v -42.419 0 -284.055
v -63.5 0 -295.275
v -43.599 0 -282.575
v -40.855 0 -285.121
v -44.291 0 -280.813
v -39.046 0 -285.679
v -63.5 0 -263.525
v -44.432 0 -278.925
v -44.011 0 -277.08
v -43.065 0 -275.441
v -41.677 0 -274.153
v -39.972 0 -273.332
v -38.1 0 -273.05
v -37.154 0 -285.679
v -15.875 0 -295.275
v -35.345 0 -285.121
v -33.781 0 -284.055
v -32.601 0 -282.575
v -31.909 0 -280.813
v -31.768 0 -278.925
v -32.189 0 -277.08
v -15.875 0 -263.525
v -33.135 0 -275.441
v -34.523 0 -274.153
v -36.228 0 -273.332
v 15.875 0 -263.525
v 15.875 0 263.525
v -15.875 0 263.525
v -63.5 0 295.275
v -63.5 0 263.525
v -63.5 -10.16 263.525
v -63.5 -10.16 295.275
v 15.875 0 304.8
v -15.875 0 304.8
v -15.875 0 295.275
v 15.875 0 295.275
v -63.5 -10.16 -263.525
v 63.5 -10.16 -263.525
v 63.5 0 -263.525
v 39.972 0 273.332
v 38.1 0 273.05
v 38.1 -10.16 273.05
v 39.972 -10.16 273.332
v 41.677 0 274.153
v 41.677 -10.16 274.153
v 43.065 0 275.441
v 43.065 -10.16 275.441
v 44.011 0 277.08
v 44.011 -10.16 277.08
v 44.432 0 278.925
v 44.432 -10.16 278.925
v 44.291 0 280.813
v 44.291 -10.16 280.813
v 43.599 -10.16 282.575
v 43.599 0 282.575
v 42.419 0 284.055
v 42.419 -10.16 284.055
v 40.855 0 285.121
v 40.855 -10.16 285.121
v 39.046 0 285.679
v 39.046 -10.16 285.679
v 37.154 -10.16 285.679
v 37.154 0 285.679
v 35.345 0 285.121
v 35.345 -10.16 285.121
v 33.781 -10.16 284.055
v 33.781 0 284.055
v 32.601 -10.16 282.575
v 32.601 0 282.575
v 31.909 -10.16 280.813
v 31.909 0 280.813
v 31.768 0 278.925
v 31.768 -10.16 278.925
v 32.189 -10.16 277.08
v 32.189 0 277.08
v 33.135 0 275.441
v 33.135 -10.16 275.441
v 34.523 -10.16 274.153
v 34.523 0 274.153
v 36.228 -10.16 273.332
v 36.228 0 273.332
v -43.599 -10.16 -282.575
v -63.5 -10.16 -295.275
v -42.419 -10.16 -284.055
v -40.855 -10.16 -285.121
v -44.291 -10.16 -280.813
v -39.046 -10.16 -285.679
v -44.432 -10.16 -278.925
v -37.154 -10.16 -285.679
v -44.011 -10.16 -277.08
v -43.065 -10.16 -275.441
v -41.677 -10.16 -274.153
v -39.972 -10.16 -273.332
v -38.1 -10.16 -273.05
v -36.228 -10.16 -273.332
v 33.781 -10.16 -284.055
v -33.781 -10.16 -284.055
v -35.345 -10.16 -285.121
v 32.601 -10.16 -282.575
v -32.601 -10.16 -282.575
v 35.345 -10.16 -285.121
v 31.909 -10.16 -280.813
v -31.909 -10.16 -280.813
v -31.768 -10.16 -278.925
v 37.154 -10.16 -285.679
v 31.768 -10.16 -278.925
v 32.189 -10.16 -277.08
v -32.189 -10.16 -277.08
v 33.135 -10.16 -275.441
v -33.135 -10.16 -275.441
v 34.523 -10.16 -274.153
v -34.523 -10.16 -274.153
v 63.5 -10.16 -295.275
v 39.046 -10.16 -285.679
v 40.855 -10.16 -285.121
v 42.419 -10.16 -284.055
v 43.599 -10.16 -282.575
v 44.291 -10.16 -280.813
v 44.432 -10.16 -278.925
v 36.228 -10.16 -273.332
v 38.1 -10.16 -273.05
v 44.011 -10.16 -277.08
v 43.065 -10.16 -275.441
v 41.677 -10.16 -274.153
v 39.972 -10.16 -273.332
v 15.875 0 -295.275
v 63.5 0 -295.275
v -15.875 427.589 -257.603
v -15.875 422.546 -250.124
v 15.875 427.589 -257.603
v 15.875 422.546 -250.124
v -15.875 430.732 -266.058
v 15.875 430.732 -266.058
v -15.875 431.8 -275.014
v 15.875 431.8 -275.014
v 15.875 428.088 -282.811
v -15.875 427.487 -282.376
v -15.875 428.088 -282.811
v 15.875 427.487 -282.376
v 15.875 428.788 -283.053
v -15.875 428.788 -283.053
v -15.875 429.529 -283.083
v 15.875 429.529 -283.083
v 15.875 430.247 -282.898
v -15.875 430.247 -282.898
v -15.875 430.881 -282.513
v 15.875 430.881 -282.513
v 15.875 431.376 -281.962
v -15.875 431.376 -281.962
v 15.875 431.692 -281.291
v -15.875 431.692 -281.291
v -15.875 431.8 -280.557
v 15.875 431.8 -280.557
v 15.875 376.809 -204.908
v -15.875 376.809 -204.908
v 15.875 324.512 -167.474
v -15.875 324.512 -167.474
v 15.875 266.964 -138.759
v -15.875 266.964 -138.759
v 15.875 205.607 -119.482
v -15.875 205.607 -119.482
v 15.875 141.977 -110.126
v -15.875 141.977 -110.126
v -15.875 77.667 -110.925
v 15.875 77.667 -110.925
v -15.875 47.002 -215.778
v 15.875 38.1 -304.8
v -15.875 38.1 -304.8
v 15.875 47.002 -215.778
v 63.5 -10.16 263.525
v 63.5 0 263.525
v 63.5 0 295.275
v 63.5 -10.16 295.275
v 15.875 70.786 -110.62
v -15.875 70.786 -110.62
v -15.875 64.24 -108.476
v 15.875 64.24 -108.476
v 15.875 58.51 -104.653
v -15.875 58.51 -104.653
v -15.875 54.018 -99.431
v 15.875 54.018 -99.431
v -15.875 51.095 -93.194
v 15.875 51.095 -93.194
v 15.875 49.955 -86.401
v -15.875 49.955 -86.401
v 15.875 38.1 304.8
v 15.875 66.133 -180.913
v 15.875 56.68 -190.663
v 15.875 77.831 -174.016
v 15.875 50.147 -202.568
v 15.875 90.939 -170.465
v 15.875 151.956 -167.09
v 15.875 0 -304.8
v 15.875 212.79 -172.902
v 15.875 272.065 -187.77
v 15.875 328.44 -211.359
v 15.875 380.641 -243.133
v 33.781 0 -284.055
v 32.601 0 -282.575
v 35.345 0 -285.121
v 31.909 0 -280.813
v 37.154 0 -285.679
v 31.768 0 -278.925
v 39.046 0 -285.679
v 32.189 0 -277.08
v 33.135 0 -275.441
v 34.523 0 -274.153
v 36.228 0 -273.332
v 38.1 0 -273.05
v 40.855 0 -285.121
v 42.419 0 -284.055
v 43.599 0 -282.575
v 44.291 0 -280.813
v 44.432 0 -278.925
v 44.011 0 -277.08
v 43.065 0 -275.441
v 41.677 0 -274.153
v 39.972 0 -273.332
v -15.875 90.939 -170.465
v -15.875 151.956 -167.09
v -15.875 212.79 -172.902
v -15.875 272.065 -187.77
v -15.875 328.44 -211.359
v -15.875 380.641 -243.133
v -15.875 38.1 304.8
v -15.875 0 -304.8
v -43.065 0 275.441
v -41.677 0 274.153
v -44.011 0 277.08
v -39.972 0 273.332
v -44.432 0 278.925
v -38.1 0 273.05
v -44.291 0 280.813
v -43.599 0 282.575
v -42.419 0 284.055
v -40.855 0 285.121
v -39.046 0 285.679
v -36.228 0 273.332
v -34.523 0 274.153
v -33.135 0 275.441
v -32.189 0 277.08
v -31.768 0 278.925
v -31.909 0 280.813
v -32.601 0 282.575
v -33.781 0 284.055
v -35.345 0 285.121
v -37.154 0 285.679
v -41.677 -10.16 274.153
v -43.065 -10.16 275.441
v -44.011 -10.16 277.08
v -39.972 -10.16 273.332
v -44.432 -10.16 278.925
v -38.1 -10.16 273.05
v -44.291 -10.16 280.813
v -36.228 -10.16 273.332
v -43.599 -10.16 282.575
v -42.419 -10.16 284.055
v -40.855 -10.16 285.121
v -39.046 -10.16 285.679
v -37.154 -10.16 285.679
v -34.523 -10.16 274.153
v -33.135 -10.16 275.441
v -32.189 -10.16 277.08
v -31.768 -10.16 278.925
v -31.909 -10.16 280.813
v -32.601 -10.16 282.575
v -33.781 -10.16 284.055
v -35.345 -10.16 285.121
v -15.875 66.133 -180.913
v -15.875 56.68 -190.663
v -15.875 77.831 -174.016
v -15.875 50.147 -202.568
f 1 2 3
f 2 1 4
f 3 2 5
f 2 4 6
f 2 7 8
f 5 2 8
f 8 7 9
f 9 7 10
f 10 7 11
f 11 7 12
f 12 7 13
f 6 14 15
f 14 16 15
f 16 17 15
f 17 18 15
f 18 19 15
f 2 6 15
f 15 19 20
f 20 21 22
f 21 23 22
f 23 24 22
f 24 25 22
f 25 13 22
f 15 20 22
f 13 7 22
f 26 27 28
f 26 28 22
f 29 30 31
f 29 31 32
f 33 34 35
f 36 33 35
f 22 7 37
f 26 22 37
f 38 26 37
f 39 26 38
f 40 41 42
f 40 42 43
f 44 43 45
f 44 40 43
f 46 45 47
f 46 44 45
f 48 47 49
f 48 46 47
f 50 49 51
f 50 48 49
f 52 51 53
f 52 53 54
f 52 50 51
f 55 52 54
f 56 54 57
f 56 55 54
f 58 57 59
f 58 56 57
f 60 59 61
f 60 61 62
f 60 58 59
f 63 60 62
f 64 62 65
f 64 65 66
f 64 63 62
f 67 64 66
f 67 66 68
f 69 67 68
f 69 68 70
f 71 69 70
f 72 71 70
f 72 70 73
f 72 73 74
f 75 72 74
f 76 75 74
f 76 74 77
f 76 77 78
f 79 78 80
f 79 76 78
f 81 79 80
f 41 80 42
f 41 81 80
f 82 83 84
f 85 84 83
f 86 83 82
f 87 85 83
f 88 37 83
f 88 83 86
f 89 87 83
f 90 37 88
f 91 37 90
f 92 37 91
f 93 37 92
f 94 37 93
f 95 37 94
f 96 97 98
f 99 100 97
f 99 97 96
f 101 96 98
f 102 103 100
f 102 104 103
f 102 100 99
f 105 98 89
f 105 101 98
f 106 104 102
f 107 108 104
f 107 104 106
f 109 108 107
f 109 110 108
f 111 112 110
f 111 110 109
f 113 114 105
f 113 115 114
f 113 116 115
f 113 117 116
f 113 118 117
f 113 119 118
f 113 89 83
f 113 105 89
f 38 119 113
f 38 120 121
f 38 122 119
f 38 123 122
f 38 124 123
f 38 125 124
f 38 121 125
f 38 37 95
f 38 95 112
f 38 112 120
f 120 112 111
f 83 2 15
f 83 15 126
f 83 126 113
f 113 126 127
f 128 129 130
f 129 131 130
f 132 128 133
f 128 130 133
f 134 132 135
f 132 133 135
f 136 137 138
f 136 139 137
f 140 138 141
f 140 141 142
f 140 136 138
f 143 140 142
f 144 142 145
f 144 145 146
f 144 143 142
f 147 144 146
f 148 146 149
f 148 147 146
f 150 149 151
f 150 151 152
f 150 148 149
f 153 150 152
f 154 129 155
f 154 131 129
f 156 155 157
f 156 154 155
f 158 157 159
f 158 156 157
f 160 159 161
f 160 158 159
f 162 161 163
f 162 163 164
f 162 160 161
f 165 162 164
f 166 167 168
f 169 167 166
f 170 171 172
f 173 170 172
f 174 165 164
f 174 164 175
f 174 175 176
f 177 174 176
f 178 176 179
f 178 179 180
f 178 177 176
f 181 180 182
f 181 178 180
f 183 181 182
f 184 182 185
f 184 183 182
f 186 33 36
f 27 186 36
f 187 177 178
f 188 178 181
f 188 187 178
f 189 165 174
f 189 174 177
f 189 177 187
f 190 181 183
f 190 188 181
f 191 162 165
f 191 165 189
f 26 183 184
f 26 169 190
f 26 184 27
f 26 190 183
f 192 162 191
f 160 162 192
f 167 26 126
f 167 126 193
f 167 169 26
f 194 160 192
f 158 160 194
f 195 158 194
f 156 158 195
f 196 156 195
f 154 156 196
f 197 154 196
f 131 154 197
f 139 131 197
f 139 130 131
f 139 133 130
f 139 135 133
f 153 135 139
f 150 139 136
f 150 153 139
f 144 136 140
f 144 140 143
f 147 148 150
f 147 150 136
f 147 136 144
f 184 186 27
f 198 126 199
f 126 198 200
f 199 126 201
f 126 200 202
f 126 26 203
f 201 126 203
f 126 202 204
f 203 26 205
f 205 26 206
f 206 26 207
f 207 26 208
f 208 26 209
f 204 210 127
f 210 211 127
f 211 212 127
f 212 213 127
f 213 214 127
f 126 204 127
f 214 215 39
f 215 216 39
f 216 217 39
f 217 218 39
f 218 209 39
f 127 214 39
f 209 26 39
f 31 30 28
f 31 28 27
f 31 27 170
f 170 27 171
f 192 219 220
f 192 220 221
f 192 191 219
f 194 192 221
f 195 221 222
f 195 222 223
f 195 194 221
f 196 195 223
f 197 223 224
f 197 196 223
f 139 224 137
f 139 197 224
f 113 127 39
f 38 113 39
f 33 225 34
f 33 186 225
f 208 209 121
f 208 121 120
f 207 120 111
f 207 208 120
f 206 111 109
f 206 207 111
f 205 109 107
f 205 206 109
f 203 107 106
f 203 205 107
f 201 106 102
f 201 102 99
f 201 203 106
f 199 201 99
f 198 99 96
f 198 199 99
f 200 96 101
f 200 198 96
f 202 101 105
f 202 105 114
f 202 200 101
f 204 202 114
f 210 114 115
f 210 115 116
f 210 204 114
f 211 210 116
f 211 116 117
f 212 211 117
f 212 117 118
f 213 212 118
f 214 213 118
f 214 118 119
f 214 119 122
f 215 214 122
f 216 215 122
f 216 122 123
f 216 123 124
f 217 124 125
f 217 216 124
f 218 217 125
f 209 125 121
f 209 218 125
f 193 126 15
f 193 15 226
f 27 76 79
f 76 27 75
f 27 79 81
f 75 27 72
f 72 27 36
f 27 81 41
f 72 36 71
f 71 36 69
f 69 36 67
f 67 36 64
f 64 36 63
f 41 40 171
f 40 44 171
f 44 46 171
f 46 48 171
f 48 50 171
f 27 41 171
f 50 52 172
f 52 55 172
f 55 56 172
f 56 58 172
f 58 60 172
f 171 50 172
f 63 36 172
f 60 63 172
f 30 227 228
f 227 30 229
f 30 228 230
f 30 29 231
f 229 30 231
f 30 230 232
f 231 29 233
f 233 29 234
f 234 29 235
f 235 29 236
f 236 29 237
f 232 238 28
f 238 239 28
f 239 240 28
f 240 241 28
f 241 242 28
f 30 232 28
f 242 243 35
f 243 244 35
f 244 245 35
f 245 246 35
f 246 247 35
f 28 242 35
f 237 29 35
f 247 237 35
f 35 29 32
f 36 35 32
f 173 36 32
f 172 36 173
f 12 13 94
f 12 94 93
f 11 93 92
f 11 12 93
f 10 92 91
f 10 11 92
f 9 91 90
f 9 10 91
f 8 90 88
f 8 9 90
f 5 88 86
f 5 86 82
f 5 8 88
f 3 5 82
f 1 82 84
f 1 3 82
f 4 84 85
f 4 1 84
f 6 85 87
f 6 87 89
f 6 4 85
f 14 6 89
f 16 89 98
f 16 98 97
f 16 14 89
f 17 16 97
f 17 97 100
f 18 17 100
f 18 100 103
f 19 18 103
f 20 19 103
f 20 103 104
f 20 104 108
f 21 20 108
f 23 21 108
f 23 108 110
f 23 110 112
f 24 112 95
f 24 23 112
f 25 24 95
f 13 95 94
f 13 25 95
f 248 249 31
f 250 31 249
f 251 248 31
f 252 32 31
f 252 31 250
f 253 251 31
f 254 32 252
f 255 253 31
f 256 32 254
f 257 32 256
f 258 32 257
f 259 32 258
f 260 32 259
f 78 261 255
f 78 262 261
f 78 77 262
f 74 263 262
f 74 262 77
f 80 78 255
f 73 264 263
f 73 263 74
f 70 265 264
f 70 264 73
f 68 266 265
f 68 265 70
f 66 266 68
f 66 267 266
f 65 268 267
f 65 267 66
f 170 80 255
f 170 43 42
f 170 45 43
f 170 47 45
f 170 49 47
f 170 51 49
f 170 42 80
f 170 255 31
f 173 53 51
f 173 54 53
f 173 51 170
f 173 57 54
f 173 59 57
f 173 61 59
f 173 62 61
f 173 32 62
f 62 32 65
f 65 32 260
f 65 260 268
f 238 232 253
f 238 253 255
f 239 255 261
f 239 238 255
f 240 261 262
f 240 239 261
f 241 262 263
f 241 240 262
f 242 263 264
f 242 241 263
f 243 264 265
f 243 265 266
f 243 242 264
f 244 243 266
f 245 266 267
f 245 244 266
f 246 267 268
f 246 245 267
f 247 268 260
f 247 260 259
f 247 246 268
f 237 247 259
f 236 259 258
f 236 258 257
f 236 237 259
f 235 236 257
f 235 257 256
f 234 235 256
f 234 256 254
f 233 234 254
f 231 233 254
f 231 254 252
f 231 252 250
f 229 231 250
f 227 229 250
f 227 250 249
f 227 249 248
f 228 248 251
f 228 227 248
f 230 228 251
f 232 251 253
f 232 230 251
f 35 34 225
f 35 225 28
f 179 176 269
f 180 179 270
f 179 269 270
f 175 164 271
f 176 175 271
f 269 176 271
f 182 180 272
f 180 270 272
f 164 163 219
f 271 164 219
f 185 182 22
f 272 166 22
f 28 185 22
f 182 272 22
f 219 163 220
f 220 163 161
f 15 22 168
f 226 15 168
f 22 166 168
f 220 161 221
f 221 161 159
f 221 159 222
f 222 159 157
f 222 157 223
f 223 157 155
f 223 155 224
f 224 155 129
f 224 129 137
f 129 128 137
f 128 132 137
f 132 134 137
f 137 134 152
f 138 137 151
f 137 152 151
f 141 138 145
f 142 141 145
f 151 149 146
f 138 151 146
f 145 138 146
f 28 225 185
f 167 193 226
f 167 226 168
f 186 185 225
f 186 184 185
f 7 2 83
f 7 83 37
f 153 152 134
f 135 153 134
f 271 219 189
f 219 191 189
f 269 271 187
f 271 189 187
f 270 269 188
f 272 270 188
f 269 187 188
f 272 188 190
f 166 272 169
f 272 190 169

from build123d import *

# Parameters (mm, degrees)
BOSS_EXTRUDE1_DEPTH = 15.875
FILLET1_R           = 38.1
FILLET2_R           = 50.8
SKETCH2_W           = 127
SKETCH2_H           = 31.75
SKETCH2_R           = 6.35
BOSS_EXTRUDE2_DEPTH = 10.16
FILLET3_R           = 2.54


with BuildPart() as part:
    # Sketch1 → Boss-Extrude1 (new, symmetric)
    with BuildSketch(Plane(origin=(0, 0, 0), x_dir=(0, 0, -1), z_dir=(1, 0, 0))):
        with BuildLine():
            Line((-304.8, 0), (304.8, 0))
            Line((304.8, 0), (304.8, 38.1))
            Line((304.8, 38.1), (177.8, 50.8))
            ThreePointArc((177.8, 50.8), (182.64153721, 255.463845718), (286.642935854, 431.8))
            Line((286.642935854, 431.8), (261.242935854, 431.8))
            ThreePointArc((261.242935854, 431.8), (141.525824012, 273.647129076), (110.92514038, 77.667243347))
            ThreePointArc((110.92514038, 77.667243347), (104.653146696, 58.510068346), (86.40105547, 49.954577438))
            Line((86.40105547, 49.954577438), (-304.8, 38.1))
            Line((-304.8, 38.1), (-304.8, 0))
        make_face()
    extrude(amount=BOSS_EXTRUDE1_DEPTH, both=True)

    # Fillet1
    fillet1_edges = [part.edges().sort_by_distance(p)[0] for p in [
        (0, 431.8, -261.242935854),
    ]]
    fillet(fillet1_edges, radius=FILLET1_R)

    # Fillet2
    fillet2_edges = [part.edges().sort_by_distance(p)[0] for p in [
        (0, 50.8, -177.8),
    ]]
    fillet(fillet2_edges, radius=FILLET2_R)

    # Sketch2 → Boss-Extrude2 (add)
    # profile 1 of 2: a face of its own
    with BuildSketch(Plane.XZ):
        with Locations((0, 279.4)):
            Rectangle(SKETCH2_W, SKETCH2_H)
        with Locations(Location((-38.1, 279.4, 0), (0, 0, 270))):
            Circle(SKETCH2_R, mode=Mode.SUBTRACT)
        with Locations(Location((38.1, 279.4, 0), (0, 0, 270))):
            Circle(SKETCH2_R, mode=Mode.SUBTRACT)
    # profile 2 of 2: a face of its own
    with BuildSketch(Plane.XZ):
        with Locations((0, -279.4)):
            Rectangle(SKETCH2_W, SKETCH2_H)
        with Locations(Location((38.1, -279.4, 0), (0, 0, 90))):
            Circle(SKETCH2_R, mode=Mode.SUBTRACT)
        with Locations(Location((-38.1, -279.4, 0), (0, 0, 90))):
            Circle(SKETCH2_R, mode=Mode.SUBTRACT)
    extrude(amount=BOSS_EXTRUDE2_DEPTH)

    # Fillet3
    fillet3_edges = [part.edges().sort_by_distance(p)[0] for p in [
        (0, 431.8, -286.642935854),
    ]]
    fillet(fillet3_edges, radius=FILLET3_R)


solid = part.part
